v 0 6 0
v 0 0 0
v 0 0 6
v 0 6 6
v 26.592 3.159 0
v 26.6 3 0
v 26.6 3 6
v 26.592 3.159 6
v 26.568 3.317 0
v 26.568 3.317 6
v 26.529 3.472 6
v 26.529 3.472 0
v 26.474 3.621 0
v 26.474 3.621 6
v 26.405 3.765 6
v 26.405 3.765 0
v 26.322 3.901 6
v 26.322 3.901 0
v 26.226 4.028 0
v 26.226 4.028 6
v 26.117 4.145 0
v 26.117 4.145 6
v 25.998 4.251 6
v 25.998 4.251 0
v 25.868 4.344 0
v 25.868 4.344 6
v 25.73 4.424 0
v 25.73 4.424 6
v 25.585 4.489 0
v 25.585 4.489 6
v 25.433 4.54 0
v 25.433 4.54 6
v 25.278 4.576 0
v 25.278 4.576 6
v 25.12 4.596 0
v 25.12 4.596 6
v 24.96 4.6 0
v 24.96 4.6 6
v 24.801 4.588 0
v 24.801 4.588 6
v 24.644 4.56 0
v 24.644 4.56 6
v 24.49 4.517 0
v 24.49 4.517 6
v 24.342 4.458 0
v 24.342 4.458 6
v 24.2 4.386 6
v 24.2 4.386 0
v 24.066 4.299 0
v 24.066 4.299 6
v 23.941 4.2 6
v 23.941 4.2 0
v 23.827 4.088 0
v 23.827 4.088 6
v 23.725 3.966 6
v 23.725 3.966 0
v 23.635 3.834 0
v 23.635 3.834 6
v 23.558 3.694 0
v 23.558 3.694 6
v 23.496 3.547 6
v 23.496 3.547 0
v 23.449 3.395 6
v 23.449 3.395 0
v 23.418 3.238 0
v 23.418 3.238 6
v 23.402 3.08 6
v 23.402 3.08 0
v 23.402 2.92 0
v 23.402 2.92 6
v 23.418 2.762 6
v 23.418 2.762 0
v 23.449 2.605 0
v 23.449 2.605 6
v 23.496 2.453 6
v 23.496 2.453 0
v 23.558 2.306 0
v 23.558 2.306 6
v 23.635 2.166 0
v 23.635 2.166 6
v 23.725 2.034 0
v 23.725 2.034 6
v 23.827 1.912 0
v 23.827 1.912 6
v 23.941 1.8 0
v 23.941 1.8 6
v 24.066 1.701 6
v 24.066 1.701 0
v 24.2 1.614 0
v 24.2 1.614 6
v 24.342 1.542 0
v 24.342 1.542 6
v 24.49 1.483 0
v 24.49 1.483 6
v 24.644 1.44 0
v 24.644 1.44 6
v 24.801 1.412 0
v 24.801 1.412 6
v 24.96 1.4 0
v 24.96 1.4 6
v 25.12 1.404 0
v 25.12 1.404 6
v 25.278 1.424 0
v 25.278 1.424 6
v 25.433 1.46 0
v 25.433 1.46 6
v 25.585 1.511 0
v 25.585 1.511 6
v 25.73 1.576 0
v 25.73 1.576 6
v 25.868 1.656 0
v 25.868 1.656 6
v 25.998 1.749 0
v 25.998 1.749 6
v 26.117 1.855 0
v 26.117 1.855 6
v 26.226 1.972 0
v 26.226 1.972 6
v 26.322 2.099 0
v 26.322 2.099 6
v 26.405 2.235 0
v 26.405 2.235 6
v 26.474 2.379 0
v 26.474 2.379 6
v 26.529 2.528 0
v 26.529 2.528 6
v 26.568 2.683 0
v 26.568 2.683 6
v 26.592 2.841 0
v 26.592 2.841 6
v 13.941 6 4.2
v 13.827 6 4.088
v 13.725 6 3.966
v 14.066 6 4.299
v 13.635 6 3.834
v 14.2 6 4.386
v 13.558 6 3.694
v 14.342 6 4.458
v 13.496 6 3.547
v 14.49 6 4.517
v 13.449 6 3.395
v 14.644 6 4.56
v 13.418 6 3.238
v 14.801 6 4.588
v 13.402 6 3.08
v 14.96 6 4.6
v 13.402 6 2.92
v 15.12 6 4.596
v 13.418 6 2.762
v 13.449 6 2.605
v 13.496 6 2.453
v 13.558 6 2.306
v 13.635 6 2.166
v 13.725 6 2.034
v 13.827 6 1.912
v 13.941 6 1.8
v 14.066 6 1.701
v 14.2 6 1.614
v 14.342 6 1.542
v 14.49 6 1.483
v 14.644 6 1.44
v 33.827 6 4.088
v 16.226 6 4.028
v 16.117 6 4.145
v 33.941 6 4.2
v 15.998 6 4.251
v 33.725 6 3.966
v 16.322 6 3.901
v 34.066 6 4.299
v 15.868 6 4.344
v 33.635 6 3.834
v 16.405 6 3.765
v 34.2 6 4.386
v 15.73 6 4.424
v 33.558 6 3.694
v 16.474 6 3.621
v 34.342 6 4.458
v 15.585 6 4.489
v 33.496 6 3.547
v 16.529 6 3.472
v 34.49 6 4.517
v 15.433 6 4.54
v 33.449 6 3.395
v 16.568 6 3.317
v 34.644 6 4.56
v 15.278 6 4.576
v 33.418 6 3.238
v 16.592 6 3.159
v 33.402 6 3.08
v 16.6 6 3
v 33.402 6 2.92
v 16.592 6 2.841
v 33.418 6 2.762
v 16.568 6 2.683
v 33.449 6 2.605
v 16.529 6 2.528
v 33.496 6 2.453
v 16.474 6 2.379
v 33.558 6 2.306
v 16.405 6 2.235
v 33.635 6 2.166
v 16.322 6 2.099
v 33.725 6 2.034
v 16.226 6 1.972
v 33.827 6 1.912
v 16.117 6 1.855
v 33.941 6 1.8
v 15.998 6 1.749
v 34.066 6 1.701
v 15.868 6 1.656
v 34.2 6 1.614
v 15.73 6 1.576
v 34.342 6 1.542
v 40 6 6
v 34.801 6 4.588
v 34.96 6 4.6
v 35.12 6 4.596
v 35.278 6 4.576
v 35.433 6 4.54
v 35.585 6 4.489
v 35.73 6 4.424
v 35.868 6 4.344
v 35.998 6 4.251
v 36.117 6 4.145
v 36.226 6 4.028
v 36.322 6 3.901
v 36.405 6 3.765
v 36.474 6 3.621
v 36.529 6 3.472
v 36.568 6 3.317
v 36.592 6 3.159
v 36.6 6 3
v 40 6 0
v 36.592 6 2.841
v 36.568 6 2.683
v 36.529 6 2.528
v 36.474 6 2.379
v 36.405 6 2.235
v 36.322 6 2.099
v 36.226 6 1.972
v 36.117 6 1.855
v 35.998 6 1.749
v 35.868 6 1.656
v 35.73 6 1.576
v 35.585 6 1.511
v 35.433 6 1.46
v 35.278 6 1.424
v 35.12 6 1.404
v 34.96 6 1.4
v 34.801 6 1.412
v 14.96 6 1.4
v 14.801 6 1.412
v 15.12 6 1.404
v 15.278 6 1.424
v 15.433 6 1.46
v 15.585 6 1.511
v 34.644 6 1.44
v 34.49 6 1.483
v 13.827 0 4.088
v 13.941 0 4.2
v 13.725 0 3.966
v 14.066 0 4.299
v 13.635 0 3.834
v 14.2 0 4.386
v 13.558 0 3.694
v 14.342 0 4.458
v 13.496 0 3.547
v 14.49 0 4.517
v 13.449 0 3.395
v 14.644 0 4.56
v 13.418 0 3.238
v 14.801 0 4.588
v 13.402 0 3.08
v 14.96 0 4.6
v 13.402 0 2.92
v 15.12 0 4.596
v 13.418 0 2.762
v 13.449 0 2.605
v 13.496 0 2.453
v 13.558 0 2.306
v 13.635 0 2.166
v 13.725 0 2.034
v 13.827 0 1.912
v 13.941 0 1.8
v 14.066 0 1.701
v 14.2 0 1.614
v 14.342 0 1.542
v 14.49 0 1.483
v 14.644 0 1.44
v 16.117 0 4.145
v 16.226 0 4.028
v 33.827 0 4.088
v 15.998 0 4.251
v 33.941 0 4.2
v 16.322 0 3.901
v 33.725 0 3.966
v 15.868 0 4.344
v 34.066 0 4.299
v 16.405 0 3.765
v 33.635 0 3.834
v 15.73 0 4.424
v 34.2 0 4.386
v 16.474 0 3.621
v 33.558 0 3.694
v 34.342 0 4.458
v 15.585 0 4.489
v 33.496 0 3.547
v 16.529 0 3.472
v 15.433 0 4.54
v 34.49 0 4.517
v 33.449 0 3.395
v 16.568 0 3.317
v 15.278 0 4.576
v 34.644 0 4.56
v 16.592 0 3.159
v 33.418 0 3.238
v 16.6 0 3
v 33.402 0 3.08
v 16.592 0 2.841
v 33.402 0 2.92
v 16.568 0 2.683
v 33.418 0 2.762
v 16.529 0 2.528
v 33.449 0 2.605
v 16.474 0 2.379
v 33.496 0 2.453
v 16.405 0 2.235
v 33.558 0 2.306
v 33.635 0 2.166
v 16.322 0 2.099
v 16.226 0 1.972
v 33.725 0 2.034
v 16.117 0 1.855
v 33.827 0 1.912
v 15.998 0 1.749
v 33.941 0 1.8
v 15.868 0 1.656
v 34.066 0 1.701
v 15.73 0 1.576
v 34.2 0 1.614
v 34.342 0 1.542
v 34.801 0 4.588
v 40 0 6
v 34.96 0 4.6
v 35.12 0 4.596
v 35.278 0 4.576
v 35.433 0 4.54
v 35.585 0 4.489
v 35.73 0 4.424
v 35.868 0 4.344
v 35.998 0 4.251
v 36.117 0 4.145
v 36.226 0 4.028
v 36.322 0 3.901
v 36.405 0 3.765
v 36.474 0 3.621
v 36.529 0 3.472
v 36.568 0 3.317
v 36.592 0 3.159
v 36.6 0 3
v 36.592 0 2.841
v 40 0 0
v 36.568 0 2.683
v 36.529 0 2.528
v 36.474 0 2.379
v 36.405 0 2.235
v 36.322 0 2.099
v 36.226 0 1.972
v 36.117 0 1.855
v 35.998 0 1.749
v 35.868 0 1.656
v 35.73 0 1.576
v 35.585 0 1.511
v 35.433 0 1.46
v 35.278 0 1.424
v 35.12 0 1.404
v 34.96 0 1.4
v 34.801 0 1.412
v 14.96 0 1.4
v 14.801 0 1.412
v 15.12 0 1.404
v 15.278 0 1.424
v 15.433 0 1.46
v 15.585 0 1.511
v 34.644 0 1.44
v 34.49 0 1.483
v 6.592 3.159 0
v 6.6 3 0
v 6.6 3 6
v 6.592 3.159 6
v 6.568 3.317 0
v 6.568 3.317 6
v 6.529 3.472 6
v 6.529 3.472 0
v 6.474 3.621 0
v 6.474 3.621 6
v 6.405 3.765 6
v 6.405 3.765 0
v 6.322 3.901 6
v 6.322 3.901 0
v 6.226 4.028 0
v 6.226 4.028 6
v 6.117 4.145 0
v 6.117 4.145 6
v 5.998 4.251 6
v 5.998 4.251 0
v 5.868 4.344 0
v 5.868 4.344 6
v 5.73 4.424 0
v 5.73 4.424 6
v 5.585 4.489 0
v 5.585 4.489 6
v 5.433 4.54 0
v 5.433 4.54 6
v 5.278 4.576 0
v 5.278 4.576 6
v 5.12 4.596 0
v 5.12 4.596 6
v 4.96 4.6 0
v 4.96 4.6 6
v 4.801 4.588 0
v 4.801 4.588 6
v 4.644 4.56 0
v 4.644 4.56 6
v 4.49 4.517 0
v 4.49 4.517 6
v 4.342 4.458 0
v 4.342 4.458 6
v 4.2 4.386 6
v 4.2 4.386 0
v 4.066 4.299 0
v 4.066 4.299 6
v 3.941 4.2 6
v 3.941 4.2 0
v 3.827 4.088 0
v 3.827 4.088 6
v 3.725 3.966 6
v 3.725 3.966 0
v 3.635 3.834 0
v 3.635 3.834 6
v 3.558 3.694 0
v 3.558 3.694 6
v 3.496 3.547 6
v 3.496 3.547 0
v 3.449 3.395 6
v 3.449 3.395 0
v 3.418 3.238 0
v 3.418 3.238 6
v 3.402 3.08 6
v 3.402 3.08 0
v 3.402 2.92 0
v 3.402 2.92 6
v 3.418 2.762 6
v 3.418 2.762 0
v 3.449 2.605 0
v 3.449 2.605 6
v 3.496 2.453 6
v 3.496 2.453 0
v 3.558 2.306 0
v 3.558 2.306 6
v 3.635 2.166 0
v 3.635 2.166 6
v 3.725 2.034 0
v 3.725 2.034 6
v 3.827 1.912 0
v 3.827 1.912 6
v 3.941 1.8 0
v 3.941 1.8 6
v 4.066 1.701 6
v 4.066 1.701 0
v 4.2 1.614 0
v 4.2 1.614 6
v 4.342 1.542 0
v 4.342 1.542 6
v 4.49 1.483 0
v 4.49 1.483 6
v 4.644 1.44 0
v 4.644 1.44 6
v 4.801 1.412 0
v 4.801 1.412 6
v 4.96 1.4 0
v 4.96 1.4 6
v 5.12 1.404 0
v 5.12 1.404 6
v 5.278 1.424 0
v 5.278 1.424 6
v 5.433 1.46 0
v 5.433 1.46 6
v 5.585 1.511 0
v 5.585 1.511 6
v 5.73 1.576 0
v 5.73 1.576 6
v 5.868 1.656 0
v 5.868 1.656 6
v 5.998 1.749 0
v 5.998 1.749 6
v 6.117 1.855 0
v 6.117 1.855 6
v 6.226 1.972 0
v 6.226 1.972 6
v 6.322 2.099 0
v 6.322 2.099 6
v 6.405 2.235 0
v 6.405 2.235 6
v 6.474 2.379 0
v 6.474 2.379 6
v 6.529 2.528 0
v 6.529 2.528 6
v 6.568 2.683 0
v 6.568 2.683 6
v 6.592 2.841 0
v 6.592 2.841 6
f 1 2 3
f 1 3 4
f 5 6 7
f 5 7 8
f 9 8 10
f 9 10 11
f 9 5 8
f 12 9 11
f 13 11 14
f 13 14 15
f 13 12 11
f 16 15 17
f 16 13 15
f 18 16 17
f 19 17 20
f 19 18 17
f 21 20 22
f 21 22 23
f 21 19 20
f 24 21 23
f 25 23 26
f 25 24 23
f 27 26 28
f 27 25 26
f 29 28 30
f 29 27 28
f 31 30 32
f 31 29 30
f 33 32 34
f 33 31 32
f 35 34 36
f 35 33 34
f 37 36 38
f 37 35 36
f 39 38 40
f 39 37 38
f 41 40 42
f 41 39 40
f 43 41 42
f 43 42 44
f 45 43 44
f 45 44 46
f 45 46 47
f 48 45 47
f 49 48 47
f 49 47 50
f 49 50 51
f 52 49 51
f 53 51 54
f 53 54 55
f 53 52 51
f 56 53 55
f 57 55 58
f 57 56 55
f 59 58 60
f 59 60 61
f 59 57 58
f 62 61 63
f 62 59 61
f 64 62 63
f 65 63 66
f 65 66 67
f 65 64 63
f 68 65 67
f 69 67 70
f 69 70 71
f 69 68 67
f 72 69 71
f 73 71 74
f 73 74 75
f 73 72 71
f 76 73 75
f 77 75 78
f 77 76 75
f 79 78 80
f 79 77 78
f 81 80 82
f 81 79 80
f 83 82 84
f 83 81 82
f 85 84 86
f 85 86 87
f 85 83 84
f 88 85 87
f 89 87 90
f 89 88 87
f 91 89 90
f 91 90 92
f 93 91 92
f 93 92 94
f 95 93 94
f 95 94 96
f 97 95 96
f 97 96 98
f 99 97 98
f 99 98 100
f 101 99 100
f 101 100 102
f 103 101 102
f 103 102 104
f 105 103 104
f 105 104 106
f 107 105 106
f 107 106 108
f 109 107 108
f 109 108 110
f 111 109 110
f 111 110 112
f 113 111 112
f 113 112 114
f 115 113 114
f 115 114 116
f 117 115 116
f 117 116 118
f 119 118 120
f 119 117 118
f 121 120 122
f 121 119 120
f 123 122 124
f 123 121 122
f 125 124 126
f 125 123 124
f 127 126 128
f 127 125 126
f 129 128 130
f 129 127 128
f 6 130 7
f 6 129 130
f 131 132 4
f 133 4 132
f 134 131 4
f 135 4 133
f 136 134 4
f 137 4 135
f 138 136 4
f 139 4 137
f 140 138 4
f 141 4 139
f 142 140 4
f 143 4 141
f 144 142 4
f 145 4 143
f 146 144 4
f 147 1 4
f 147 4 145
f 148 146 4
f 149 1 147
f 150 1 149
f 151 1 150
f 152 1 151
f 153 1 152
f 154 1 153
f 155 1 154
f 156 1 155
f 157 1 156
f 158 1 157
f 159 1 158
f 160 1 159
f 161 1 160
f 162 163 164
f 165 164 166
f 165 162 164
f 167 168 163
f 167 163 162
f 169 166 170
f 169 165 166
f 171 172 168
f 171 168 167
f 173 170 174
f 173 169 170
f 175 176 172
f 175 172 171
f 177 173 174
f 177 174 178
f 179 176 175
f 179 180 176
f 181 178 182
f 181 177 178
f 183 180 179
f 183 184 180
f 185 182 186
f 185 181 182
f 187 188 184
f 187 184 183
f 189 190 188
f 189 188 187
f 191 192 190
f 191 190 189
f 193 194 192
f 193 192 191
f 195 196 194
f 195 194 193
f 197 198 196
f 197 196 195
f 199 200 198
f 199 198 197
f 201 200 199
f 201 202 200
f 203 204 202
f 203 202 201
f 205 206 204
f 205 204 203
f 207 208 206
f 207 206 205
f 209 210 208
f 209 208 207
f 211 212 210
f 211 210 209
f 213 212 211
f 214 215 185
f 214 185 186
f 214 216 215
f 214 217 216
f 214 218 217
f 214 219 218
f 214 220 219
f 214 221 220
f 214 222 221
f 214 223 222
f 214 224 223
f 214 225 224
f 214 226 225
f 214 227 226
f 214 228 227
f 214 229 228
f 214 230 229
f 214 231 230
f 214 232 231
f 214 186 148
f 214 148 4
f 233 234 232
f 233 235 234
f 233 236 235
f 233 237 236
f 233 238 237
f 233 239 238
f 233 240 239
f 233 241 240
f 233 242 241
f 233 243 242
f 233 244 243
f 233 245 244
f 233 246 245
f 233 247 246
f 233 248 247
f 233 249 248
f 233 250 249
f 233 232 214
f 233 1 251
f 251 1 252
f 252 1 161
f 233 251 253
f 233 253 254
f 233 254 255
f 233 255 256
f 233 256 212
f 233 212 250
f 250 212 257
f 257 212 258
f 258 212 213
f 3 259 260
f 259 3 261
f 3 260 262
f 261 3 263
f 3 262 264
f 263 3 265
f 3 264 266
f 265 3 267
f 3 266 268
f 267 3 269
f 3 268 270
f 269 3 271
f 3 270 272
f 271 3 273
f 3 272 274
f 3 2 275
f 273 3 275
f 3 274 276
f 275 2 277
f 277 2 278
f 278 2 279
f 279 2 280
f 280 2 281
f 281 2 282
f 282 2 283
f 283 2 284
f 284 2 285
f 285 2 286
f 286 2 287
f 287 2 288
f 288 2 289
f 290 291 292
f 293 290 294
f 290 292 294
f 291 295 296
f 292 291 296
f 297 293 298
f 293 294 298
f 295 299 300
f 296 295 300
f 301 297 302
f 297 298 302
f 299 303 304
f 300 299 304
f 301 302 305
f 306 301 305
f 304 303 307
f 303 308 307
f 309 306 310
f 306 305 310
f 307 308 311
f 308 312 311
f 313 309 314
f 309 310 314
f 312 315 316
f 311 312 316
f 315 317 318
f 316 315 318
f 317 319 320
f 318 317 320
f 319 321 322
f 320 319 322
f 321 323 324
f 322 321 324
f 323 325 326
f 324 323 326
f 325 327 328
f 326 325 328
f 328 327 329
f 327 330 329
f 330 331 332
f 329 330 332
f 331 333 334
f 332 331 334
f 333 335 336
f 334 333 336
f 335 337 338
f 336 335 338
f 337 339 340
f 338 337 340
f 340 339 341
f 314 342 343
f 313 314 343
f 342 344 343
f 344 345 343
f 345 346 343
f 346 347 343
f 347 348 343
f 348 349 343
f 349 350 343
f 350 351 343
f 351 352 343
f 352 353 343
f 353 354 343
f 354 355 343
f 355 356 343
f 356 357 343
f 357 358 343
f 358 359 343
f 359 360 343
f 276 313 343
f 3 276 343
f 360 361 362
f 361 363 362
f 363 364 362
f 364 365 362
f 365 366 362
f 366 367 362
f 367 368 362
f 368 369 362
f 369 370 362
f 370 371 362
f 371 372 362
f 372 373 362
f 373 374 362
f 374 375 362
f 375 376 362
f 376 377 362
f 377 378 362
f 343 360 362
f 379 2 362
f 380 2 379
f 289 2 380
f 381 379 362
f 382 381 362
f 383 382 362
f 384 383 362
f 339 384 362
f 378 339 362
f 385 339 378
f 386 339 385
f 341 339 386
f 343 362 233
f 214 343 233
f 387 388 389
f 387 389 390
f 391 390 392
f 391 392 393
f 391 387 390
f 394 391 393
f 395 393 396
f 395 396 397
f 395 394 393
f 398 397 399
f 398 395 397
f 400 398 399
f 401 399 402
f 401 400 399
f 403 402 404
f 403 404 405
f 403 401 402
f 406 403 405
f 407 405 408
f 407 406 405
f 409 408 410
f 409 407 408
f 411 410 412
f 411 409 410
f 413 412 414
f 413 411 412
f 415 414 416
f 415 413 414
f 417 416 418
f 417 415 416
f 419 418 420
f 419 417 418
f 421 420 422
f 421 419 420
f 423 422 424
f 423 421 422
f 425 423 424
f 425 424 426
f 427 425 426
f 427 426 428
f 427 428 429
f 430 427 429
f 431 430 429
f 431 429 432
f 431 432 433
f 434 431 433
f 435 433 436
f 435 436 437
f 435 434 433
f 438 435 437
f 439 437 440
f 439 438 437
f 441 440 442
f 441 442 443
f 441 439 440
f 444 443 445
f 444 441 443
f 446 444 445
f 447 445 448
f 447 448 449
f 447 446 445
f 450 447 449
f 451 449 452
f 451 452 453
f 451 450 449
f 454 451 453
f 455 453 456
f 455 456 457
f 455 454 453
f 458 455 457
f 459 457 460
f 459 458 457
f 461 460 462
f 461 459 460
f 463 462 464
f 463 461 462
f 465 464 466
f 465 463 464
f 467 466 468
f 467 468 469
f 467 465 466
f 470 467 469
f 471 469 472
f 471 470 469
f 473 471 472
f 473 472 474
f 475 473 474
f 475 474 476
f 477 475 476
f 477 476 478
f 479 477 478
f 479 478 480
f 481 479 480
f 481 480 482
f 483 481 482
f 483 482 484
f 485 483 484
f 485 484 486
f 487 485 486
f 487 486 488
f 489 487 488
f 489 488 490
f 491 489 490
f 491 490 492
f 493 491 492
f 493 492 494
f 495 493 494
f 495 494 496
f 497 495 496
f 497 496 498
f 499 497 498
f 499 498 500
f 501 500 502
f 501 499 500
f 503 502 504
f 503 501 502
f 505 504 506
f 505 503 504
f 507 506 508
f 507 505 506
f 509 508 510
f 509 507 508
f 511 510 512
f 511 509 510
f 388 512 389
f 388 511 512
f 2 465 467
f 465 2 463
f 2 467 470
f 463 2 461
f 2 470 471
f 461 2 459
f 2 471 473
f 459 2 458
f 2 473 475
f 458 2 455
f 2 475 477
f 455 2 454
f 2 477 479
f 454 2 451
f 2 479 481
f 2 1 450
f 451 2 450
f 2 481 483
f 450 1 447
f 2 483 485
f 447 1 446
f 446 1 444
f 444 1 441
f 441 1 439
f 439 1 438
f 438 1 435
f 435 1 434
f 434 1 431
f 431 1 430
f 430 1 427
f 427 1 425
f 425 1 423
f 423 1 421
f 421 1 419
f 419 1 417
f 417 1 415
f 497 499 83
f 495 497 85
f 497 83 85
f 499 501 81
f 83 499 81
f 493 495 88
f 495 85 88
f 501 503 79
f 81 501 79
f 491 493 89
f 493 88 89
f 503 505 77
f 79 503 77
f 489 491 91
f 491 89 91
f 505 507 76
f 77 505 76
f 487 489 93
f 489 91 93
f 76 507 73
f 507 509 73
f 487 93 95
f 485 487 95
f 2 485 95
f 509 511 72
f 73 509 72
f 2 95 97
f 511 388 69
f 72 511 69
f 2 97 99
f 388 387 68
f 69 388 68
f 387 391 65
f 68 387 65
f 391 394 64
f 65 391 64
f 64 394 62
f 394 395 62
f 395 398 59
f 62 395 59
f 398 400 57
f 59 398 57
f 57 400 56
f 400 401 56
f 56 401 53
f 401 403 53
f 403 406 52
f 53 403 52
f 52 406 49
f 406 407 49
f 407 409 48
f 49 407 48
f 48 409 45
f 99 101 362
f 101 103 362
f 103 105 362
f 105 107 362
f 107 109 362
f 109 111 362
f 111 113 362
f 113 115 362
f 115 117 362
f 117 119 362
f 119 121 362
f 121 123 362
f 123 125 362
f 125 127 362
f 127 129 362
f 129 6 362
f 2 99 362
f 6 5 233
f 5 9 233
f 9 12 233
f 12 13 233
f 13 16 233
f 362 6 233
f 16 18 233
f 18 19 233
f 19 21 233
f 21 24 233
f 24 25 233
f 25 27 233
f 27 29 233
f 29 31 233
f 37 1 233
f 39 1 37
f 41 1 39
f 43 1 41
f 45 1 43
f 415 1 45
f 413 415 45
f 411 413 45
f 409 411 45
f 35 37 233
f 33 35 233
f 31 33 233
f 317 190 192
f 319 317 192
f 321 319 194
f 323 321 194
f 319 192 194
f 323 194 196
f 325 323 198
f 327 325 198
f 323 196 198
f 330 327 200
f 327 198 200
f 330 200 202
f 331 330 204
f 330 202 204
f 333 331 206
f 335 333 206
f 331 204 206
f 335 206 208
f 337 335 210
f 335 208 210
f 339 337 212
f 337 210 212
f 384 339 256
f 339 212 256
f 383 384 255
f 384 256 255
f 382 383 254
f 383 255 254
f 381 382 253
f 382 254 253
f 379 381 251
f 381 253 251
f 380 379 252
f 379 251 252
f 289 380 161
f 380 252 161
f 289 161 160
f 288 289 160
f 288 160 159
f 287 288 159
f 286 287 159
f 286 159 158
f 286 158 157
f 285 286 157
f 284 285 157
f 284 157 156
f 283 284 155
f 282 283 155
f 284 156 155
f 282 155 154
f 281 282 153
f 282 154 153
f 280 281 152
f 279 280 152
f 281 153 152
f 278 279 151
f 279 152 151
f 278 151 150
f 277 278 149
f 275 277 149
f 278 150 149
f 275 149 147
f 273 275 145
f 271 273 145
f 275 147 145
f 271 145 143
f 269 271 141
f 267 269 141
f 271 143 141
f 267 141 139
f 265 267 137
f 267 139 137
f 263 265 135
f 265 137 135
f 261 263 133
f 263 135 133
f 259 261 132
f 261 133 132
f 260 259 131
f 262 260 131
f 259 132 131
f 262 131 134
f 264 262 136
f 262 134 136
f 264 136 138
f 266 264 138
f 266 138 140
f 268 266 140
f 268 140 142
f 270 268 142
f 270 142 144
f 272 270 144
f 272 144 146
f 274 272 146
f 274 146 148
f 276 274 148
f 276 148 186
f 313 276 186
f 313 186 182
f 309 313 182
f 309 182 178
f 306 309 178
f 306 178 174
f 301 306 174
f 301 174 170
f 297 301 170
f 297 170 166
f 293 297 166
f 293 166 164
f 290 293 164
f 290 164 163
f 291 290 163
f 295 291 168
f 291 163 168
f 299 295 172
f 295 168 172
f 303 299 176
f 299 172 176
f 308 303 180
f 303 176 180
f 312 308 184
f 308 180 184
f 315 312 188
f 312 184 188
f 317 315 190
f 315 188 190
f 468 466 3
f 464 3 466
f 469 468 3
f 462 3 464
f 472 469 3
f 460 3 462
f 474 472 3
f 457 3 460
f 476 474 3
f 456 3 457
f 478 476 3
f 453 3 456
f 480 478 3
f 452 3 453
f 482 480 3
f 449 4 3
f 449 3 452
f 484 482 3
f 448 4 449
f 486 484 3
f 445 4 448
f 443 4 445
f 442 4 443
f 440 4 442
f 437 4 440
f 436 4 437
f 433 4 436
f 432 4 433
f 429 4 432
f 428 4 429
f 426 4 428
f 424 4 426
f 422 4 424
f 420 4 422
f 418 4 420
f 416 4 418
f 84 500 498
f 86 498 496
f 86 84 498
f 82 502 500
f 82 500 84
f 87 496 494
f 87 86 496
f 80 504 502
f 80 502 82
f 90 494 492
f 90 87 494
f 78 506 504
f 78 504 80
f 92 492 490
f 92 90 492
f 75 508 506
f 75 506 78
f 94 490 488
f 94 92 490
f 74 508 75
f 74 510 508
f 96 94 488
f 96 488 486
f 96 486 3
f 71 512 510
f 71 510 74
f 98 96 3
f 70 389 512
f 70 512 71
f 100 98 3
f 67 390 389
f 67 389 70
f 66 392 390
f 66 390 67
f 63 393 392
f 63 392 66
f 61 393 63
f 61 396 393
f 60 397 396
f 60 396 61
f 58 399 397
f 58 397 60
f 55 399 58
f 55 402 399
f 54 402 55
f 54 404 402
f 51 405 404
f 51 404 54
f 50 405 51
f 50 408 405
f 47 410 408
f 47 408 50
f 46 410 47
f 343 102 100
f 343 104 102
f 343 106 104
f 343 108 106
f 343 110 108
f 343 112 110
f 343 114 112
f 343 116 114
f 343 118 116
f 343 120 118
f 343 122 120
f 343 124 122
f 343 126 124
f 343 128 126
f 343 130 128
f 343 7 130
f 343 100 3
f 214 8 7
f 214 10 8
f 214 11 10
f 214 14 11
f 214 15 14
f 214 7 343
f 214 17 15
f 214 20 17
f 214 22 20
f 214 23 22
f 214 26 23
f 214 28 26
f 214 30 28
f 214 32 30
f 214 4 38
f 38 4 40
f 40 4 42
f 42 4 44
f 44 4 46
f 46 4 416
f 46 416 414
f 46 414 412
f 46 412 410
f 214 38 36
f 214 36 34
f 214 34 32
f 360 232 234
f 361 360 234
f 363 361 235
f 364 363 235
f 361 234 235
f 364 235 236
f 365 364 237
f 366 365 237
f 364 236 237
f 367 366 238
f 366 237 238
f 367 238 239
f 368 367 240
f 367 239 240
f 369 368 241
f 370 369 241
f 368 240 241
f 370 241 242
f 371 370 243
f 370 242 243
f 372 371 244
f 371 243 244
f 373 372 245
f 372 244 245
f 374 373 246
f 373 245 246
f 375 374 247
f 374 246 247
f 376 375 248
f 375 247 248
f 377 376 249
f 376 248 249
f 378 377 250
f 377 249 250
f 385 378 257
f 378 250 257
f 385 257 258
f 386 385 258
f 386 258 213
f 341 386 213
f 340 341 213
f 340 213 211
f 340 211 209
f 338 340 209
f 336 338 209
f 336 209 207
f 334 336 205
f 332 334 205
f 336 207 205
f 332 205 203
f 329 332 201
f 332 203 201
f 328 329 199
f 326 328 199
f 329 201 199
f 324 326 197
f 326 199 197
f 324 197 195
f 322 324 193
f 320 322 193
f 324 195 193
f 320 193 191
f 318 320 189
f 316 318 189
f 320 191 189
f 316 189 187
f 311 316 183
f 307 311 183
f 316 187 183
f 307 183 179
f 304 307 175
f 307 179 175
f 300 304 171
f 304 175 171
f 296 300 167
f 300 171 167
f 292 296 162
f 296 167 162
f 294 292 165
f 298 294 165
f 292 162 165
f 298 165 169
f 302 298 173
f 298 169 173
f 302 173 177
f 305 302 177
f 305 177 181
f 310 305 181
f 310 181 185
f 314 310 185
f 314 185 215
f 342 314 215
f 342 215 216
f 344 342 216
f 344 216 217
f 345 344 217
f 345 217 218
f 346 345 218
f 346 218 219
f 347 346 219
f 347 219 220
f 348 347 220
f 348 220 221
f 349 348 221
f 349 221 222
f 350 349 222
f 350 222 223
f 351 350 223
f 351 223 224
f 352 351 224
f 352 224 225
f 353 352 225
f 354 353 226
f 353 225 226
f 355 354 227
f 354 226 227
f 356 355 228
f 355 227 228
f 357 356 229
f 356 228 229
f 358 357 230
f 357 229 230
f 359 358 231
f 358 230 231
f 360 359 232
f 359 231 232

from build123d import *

# Parameters (mm, degrees)
SKETCH_1_W          = 40
SKETCH_1_H          = 6
SKETCH_1_R          = 1.6
EXTRUDE_1_DEPTH     = 6
SKETCH_2_R          = 1.6
CUT_EXTRUDE_1_DEPTH = 6


with BuildPart() as part:
    # 草图1 → 凸台-拉伸1 (new body)
    with BuildSketch(Plane.XY):
        with Locations((20, 3)):
            Rectangle(SKETCH_1_W, SKETCH_1_H)
        with Locations((5, 3)):
            Circle(SKETCH_1_R, mode=Mode.SUBTRACT)
        with Locations((25, 3)):
            Circle(SKETCH_1_R, mode=Mode.SUBTRACT)
    extrude(amount=EXTRUDE_1_DEPTH)

    # 草图2 → 切除-拉伸1 (cut)
    with BuildSketch(Plane(origin=(0, 6, 0), x_dir=(1, 0, 0), z_dir=(0, 1, 0))):
        with Locations((35, -3)):
            Circle(SKETCH_2_R)
        with Locations((15, -3)):
            Circle(SKETCH_2_R)
    extrude(amount=-CUT_EXTRUDE_1_DEPTH, mode=Mode.SUBTRACT)


solid = part.part
